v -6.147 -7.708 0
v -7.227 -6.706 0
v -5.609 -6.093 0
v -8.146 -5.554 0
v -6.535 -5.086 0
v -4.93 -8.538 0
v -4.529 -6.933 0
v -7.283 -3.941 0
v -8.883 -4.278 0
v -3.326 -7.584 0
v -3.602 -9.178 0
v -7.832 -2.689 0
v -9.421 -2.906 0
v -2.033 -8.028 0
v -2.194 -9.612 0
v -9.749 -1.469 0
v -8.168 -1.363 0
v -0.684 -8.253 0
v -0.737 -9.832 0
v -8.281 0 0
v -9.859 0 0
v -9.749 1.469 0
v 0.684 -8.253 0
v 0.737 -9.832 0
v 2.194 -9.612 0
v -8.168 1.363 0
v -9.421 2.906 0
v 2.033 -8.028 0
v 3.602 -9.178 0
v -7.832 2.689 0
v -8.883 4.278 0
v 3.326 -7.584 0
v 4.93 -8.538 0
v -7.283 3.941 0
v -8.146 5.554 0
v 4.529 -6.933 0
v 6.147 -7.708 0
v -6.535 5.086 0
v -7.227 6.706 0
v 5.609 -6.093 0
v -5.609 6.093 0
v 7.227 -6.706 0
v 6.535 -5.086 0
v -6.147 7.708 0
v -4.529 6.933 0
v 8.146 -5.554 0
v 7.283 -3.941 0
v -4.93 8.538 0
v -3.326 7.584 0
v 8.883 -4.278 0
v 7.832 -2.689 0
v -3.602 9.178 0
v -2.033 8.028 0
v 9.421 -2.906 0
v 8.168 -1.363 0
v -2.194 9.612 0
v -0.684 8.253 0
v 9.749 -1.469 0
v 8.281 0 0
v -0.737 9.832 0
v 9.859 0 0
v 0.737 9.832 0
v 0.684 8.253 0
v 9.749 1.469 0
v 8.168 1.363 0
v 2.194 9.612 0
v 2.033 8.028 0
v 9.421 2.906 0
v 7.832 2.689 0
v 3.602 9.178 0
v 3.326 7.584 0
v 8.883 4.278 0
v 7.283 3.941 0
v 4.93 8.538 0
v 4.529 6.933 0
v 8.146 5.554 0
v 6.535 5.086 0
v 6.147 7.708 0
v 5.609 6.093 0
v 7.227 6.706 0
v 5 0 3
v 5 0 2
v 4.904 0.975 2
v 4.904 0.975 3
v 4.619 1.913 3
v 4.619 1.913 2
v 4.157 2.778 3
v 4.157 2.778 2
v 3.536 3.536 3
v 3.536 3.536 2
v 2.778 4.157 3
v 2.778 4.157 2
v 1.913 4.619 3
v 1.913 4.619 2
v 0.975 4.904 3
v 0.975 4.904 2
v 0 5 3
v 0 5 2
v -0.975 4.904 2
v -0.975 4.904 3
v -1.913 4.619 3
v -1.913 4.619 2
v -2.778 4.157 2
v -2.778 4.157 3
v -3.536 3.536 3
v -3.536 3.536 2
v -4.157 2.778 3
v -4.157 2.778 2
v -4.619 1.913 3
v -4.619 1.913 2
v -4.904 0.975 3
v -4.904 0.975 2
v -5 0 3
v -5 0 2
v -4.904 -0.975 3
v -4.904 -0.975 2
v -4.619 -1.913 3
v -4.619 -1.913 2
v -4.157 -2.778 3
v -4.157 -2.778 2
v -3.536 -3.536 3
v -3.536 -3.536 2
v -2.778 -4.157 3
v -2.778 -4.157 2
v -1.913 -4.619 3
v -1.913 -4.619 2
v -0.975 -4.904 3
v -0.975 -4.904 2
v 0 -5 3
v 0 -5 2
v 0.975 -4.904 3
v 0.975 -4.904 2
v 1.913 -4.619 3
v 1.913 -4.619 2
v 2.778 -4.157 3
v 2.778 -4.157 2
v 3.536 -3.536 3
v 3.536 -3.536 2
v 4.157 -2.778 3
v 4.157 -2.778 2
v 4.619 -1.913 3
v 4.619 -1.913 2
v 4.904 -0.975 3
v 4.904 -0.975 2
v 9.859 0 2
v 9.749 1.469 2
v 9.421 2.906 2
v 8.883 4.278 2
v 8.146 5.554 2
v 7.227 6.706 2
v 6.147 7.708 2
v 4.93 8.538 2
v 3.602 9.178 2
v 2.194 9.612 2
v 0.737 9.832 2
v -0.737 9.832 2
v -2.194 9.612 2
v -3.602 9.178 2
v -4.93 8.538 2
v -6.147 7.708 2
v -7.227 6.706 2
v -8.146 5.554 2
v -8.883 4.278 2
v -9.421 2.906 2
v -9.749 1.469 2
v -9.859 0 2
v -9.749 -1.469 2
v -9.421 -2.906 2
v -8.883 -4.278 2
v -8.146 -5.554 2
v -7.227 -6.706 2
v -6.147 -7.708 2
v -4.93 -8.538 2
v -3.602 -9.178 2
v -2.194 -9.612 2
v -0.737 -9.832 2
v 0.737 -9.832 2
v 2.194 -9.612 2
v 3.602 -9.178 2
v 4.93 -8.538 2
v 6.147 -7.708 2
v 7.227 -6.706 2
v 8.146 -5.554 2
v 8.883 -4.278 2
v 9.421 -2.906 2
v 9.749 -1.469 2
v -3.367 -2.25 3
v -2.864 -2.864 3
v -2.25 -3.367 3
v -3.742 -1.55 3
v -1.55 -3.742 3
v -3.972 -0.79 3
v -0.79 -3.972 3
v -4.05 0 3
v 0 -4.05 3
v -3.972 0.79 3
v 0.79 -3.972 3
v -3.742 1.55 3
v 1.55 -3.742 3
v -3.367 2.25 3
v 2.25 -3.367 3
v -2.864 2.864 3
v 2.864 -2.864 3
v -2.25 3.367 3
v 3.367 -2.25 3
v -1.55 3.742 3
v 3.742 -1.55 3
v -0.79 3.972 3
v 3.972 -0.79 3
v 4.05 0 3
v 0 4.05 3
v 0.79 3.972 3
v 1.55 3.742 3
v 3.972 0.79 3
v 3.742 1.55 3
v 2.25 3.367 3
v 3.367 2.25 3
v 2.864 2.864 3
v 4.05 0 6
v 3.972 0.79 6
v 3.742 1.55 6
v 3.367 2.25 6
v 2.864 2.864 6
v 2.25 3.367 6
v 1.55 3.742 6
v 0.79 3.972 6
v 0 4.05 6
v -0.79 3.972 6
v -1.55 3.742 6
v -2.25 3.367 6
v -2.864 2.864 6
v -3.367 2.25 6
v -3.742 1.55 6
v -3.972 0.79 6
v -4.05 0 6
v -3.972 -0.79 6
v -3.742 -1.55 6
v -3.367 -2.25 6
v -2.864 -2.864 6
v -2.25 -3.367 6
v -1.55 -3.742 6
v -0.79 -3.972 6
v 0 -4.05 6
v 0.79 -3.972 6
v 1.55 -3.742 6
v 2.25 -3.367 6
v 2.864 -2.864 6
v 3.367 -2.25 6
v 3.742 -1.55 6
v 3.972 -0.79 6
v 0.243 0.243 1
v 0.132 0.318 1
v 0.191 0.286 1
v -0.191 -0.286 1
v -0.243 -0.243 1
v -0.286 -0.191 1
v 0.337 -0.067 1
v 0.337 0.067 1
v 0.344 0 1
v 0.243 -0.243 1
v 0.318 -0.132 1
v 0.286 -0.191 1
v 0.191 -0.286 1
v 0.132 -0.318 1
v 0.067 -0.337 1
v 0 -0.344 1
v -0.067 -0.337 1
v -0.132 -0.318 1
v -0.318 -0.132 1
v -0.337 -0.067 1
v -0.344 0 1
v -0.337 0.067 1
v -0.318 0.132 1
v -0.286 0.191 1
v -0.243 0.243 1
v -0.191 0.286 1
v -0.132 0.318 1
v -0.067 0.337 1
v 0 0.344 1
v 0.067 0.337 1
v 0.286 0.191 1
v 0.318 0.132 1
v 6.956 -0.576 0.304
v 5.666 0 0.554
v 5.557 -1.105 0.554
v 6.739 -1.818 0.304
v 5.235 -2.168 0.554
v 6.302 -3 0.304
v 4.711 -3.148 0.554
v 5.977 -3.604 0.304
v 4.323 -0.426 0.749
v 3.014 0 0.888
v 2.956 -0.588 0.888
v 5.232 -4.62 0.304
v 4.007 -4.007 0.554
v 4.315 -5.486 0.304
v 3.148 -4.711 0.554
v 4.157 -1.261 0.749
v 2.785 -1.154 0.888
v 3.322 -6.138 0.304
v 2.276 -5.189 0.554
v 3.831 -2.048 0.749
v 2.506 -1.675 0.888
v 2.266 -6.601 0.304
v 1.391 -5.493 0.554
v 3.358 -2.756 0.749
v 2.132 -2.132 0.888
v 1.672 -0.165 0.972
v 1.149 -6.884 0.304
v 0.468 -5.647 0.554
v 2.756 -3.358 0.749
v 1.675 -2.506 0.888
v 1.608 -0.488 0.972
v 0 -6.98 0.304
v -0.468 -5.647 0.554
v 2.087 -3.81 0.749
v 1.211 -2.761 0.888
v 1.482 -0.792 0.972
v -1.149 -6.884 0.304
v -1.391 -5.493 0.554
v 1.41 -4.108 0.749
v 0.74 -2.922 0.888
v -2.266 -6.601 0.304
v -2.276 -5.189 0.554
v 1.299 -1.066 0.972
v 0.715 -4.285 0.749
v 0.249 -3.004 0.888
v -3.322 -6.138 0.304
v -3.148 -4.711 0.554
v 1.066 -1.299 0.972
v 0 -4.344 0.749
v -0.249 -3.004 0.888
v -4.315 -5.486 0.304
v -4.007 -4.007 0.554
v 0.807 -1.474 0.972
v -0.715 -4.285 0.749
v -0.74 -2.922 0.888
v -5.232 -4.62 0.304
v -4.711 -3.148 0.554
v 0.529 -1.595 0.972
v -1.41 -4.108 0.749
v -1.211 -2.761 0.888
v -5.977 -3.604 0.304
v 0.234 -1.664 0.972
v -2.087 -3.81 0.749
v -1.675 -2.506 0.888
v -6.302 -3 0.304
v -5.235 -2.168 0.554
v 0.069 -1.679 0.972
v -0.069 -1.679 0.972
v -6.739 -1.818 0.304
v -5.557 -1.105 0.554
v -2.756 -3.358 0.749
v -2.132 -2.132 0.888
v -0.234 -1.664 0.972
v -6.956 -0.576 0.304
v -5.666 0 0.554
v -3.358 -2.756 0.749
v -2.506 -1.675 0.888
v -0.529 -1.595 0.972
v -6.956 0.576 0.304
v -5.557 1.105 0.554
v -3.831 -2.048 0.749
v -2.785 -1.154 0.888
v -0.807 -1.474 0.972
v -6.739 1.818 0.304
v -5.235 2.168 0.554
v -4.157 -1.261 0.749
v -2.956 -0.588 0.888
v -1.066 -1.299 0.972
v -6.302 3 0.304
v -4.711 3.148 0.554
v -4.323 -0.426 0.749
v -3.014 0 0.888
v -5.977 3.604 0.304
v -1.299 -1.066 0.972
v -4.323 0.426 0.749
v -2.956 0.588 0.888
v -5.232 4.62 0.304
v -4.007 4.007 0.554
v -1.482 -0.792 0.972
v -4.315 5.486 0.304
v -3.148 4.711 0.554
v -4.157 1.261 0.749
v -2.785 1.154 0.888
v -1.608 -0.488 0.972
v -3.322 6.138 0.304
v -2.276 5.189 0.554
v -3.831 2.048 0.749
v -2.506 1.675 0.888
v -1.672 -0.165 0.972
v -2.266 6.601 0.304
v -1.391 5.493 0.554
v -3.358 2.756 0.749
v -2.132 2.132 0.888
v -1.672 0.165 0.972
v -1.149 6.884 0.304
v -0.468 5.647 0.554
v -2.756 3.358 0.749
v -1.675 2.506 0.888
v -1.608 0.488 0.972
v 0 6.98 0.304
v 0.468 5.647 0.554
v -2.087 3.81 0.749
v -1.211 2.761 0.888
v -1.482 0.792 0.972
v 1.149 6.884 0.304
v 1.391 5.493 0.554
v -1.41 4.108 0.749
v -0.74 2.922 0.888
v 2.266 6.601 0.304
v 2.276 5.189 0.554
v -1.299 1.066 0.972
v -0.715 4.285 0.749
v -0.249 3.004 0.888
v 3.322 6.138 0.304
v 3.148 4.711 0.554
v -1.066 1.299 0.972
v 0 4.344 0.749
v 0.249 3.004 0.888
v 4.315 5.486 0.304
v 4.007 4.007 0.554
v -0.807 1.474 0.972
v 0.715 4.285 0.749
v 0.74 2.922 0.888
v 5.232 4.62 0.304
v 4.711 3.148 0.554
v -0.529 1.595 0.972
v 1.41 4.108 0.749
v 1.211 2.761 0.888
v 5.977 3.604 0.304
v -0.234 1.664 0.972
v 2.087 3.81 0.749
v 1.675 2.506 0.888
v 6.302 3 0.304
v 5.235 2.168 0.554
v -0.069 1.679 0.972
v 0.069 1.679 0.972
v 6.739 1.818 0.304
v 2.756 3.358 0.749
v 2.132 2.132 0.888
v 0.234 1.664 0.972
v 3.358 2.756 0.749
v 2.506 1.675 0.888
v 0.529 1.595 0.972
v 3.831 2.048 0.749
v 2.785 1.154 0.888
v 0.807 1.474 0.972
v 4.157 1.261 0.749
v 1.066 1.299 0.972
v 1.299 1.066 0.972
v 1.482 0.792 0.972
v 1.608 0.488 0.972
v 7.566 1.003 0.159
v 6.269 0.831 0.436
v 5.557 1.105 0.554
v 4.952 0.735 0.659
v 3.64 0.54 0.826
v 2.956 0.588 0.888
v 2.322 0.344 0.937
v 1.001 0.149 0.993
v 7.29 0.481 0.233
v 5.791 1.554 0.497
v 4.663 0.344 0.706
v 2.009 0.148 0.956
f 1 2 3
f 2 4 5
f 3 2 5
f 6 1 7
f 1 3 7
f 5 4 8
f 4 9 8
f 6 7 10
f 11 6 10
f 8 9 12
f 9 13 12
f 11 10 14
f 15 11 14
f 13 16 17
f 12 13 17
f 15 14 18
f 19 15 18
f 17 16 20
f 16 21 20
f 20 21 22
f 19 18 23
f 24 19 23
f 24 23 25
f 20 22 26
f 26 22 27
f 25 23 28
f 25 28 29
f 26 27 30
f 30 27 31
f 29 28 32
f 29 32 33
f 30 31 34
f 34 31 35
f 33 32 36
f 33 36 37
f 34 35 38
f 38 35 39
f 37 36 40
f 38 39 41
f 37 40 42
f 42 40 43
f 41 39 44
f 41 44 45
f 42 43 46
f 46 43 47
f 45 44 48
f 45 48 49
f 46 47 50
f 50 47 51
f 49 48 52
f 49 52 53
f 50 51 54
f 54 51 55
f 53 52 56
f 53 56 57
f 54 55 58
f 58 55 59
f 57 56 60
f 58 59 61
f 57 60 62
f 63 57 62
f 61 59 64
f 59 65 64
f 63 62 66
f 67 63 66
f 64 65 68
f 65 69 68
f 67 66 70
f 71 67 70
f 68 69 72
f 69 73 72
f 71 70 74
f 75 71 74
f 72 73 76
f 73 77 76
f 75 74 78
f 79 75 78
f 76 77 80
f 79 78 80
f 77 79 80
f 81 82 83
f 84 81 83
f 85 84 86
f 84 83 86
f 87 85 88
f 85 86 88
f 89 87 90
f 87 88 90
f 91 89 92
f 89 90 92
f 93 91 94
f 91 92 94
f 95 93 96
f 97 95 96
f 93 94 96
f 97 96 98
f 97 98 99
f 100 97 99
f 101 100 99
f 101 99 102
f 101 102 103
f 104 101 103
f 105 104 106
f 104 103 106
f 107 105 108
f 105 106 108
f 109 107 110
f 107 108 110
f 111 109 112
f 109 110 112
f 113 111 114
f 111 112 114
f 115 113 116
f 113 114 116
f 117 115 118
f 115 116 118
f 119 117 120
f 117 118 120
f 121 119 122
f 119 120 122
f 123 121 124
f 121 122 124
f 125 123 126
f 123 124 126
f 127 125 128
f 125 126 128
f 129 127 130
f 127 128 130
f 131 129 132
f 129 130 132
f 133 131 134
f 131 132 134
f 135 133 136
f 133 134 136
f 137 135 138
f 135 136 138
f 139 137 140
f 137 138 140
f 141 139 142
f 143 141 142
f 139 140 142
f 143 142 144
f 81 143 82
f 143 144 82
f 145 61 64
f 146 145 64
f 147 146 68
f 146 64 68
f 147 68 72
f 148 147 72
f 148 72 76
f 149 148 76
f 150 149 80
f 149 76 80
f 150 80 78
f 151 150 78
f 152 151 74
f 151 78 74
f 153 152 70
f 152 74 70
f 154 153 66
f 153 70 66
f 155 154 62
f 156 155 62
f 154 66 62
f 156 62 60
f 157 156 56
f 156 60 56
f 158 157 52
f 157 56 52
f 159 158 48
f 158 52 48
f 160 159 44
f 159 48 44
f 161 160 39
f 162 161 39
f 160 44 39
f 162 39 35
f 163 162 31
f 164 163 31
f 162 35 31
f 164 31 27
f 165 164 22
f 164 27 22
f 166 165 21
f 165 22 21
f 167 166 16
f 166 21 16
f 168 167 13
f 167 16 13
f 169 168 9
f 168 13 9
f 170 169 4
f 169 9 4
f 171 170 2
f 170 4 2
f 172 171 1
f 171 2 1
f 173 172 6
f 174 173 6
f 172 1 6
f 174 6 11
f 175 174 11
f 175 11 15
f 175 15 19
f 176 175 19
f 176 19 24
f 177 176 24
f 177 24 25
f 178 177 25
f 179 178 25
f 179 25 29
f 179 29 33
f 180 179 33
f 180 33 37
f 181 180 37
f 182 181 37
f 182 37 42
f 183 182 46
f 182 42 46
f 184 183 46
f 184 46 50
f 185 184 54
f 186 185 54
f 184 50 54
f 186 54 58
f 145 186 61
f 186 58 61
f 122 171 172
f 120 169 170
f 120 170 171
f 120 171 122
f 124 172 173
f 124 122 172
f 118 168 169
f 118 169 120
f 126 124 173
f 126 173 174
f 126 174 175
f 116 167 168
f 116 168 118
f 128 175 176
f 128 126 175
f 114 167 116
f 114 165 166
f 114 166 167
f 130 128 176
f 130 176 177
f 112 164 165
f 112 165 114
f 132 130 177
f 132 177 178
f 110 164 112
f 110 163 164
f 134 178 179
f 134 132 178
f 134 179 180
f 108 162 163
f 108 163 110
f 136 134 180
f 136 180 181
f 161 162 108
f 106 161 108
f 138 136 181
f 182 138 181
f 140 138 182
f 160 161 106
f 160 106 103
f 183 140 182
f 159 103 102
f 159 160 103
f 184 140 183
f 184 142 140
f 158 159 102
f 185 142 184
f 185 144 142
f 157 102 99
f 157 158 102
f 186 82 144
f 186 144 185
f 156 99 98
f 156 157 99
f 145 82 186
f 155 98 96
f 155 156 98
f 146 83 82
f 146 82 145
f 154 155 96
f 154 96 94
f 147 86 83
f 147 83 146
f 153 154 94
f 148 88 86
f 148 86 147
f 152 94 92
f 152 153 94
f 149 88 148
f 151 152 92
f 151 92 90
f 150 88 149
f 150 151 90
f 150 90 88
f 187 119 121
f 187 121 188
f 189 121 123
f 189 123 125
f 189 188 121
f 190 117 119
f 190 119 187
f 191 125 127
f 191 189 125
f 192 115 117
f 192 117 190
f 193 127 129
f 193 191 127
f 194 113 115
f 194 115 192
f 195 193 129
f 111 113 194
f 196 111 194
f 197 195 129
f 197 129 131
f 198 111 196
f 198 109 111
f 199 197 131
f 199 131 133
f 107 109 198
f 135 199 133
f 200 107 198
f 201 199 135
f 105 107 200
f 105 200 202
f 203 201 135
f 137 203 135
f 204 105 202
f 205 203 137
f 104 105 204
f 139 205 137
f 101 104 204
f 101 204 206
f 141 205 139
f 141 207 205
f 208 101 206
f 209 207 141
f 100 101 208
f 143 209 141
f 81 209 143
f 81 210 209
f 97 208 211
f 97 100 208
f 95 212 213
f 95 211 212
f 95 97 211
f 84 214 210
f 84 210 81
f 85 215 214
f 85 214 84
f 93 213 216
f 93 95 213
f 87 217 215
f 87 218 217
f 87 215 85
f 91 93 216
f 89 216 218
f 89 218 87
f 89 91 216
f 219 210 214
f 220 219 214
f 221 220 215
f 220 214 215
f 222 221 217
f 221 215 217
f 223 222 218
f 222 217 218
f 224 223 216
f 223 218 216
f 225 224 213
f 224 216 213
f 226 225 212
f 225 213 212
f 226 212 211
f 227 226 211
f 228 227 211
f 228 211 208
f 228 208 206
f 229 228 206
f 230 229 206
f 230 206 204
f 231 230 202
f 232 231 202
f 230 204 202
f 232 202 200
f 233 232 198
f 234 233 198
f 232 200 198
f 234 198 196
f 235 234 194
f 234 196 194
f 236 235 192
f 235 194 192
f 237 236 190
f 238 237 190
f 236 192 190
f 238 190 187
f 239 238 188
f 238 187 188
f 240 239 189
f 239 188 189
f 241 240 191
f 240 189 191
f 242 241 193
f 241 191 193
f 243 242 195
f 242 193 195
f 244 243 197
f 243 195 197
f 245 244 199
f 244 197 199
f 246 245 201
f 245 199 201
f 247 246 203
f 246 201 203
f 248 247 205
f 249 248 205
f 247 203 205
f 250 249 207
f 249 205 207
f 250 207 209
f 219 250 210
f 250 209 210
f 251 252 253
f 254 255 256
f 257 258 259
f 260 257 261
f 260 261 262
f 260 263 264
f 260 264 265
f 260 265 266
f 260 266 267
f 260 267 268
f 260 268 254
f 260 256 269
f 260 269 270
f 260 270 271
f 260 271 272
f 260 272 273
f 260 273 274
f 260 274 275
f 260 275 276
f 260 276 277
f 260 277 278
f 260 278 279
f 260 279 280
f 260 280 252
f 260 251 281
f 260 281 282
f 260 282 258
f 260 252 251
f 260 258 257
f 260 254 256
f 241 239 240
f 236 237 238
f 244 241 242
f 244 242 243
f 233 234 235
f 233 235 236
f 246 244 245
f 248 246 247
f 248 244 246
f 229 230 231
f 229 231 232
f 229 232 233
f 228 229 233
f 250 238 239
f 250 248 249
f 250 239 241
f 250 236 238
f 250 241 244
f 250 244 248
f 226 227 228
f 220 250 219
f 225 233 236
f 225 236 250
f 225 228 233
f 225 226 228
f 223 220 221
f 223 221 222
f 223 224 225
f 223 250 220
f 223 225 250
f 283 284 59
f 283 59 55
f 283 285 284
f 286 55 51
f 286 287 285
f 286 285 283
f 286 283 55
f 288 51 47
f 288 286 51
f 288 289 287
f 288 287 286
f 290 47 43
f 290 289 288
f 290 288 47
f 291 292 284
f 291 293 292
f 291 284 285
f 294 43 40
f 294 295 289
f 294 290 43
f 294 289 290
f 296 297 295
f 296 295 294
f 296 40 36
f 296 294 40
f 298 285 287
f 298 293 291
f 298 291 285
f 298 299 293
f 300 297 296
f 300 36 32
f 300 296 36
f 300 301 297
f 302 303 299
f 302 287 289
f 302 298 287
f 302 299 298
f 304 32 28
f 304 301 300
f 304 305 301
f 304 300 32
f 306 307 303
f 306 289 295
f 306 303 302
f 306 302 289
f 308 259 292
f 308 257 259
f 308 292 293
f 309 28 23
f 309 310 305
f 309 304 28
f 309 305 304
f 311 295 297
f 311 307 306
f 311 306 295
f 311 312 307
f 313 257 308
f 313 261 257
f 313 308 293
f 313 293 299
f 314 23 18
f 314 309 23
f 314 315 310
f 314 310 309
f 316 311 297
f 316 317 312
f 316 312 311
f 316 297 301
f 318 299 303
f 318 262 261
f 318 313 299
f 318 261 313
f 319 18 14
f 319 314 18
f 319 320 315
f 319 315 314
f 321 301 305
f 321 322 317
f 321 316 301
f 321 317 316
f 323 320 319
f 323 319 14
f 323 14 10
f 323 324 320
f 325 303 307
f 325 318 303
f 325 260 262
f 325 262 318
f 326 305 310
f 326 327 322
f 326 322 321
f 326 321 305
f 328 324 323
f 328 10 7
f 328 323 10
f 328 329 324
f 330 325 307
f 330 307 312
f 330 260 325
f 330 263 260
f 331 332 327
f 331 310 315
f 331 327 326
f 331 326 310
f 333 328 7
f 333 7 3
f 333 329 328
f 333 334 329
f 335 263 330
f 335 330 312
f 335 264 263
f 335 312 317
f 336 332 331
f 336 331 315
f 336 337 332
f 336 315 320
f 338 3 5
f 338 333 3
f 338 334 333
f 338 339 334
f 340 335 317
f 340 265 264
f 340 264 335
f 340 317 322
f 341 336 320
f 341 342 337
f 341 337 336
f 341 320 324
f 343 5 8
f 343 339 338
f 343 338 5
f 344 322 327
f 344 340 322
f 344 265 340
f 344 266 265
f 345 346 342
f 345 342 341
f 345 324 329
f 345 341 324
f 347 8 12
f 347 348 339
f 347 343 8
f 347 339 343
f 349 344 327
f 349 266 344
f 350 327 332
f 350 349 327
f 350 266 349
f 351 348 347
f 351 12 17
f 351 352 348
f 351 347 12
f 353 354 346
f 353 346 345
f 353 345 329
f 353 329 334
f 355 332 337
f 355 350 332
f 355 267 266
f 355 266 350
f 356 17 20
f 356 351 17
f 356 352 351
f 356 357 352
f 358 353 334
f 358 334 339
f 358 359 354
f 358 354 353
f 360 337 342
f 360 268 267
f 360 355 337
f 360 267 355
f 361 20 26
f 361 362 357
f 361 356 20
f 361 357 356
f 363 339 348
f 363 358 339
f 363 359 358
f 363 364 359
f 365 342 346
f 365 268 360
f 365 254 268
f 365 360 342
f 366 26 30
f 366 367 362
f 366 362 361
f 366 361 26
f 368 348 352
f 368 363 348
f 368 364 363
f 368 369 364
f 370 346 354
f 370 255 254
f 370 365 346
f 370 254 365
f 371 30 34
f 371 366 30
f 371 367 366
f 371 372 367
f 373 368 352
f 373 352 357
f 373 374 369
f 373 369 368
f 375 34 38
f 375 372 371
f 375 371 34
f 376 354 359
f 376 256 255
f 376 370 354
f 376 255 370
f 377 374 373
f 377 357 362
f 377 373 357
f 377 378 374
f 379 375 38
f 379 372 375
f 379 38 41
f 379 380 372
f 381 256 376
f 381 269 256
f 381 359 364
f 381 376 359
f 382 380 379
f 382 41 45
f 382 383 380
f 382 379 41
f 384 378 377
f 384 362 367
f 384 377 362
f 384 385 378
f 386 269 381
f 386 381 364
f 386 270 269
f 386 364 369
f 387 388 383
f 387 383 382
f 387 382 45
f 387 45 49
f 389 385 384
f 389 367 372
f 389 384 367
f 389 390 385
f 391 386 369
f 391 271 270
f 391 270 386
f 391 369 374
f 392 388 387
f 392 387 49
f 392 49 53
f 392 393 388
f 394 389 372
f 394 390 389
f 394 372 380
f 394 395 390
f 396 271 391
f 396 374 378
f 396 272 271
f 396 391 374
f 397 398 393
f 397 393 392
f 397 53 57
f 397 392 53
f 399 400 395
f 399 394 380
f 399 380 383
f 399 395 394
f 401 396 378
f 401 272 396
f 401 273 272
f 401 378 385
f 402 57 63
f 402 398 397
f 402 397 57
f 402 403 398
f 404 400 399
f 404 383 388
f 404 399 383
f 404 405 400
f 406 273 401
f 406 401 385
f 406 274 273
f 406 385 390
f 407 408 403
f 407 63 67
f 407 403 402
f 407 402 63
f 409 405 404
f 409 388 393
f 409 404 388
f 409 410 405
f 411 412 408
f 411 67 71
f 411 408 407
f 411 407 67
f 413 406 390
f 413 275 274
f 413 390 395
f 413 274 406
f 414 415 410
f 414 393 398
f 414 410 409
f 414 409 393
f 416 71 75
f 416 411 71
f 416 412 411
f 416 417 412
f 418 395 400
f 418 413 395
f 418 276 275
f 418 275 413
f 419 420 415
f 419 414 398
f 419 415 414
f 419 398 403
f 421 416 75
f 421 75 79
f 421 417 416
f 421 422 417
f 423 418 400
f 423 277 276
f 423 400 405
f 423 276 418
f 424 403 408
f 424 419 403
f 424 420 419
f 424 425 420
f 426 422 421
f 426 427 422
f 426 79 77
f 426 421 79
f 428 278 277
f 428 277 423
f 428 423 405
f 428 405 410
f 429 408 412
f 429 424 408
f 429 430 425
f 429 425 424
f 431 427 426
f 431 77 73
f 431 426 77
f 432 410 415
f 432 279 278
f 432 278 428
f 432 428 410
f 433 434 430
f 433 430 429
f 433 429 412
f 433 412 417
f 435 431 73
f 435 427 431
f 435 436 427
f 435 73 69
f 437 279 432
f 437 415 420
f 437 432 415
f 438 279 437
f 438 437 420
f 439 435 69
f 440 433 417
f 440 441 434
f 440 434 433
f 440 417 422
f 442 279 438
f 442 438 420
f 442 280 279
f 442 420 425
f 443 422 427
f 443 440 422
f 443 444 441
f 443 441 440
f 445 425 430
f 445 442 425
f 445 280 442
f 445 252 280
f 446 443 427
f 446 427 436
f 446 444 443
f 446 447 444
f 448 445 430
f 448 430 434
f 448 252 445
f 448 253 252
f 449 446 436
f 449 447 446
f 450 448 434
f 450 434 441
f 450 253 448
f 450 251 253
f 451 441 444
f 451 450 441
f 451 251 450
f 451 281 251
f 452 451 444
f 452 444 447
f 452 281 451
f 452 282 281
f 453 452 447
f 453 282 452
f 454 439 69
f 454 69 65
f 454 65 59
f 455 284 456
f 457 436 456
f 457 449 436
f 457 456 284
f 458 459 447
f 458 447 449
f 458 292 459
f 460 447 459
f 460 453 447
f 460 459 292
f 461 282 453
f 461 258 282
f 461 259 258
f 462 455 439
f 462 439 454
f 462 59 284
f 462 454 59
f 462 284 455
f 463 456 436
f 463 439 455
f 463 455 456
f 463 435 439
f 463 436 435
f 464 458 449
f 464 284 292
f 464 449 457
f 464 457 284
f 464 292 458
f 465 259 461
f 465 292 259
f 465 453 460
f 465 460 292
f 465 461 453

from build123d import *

# Parameters (mm, degrees)
F0_R     = 9.8592181747
F1_DEPTH = 2
F2_R     = 5
F3_DEPTH = 1
F4_R     = 4.05
F5_DEPTH = 3
F6_R     = 8.2811029309
F7_DEPTH = 1


# Not quite as in the source:
# - a fillet or chamfer that OpenCascade refuses, or shapes differently, is made with other operations: its cross-section is extruded or revolved along the edge and cut away or added


with BuildPart() as f1:
    # F0 (on Top) → F1 (new body)
    with BuildSketch(Plane.XY):
        Circle(F0_R)
    extrude(amount=F1_DEPTH)

    # F2 (on face) → F3 (join)
    with BuildSketch(Plane.XY.offset(2)):
        Circle(F2_R)
    extrude(amount=F3_DEPTH)

    # F4 (on face) → F5 (join)
    with BuildSketch(Plane.XY.offset(3)):
        Circle(F4_R)
    extrude(amount=F5_DEPTH)

    # F6 (on face) → F7 (cut)
    with BuildSketch(Plane(origin=(0, 0, 0), x_dir=(1, 0, 0), z_dir=(0, 0, -1))):
        Circle(F6_R)
    extrude(amount=-F7_DEPTH, mode=Mode.SUBTRACT)

    # F8: fillet of radius 32 on 1 edges, made by hand

    # F8_s1 → F8_t2 (revolve)
    with BuildSketch(Plane.XZ):
        with BuildLine():
            ThreePointArc((8.2811029309, 0), (4.3438489977, 0.7490157328), (0.3438489977, 1))
            Line((0.3438489977, 1), (8.2811029309, 1))
            Line((8.2811029309, 1), (8.2811029309, 0))
        make_face()
    revolve(axis=Axis((0, 0, 1), (0, 0, -1)))


solid = f1.part
